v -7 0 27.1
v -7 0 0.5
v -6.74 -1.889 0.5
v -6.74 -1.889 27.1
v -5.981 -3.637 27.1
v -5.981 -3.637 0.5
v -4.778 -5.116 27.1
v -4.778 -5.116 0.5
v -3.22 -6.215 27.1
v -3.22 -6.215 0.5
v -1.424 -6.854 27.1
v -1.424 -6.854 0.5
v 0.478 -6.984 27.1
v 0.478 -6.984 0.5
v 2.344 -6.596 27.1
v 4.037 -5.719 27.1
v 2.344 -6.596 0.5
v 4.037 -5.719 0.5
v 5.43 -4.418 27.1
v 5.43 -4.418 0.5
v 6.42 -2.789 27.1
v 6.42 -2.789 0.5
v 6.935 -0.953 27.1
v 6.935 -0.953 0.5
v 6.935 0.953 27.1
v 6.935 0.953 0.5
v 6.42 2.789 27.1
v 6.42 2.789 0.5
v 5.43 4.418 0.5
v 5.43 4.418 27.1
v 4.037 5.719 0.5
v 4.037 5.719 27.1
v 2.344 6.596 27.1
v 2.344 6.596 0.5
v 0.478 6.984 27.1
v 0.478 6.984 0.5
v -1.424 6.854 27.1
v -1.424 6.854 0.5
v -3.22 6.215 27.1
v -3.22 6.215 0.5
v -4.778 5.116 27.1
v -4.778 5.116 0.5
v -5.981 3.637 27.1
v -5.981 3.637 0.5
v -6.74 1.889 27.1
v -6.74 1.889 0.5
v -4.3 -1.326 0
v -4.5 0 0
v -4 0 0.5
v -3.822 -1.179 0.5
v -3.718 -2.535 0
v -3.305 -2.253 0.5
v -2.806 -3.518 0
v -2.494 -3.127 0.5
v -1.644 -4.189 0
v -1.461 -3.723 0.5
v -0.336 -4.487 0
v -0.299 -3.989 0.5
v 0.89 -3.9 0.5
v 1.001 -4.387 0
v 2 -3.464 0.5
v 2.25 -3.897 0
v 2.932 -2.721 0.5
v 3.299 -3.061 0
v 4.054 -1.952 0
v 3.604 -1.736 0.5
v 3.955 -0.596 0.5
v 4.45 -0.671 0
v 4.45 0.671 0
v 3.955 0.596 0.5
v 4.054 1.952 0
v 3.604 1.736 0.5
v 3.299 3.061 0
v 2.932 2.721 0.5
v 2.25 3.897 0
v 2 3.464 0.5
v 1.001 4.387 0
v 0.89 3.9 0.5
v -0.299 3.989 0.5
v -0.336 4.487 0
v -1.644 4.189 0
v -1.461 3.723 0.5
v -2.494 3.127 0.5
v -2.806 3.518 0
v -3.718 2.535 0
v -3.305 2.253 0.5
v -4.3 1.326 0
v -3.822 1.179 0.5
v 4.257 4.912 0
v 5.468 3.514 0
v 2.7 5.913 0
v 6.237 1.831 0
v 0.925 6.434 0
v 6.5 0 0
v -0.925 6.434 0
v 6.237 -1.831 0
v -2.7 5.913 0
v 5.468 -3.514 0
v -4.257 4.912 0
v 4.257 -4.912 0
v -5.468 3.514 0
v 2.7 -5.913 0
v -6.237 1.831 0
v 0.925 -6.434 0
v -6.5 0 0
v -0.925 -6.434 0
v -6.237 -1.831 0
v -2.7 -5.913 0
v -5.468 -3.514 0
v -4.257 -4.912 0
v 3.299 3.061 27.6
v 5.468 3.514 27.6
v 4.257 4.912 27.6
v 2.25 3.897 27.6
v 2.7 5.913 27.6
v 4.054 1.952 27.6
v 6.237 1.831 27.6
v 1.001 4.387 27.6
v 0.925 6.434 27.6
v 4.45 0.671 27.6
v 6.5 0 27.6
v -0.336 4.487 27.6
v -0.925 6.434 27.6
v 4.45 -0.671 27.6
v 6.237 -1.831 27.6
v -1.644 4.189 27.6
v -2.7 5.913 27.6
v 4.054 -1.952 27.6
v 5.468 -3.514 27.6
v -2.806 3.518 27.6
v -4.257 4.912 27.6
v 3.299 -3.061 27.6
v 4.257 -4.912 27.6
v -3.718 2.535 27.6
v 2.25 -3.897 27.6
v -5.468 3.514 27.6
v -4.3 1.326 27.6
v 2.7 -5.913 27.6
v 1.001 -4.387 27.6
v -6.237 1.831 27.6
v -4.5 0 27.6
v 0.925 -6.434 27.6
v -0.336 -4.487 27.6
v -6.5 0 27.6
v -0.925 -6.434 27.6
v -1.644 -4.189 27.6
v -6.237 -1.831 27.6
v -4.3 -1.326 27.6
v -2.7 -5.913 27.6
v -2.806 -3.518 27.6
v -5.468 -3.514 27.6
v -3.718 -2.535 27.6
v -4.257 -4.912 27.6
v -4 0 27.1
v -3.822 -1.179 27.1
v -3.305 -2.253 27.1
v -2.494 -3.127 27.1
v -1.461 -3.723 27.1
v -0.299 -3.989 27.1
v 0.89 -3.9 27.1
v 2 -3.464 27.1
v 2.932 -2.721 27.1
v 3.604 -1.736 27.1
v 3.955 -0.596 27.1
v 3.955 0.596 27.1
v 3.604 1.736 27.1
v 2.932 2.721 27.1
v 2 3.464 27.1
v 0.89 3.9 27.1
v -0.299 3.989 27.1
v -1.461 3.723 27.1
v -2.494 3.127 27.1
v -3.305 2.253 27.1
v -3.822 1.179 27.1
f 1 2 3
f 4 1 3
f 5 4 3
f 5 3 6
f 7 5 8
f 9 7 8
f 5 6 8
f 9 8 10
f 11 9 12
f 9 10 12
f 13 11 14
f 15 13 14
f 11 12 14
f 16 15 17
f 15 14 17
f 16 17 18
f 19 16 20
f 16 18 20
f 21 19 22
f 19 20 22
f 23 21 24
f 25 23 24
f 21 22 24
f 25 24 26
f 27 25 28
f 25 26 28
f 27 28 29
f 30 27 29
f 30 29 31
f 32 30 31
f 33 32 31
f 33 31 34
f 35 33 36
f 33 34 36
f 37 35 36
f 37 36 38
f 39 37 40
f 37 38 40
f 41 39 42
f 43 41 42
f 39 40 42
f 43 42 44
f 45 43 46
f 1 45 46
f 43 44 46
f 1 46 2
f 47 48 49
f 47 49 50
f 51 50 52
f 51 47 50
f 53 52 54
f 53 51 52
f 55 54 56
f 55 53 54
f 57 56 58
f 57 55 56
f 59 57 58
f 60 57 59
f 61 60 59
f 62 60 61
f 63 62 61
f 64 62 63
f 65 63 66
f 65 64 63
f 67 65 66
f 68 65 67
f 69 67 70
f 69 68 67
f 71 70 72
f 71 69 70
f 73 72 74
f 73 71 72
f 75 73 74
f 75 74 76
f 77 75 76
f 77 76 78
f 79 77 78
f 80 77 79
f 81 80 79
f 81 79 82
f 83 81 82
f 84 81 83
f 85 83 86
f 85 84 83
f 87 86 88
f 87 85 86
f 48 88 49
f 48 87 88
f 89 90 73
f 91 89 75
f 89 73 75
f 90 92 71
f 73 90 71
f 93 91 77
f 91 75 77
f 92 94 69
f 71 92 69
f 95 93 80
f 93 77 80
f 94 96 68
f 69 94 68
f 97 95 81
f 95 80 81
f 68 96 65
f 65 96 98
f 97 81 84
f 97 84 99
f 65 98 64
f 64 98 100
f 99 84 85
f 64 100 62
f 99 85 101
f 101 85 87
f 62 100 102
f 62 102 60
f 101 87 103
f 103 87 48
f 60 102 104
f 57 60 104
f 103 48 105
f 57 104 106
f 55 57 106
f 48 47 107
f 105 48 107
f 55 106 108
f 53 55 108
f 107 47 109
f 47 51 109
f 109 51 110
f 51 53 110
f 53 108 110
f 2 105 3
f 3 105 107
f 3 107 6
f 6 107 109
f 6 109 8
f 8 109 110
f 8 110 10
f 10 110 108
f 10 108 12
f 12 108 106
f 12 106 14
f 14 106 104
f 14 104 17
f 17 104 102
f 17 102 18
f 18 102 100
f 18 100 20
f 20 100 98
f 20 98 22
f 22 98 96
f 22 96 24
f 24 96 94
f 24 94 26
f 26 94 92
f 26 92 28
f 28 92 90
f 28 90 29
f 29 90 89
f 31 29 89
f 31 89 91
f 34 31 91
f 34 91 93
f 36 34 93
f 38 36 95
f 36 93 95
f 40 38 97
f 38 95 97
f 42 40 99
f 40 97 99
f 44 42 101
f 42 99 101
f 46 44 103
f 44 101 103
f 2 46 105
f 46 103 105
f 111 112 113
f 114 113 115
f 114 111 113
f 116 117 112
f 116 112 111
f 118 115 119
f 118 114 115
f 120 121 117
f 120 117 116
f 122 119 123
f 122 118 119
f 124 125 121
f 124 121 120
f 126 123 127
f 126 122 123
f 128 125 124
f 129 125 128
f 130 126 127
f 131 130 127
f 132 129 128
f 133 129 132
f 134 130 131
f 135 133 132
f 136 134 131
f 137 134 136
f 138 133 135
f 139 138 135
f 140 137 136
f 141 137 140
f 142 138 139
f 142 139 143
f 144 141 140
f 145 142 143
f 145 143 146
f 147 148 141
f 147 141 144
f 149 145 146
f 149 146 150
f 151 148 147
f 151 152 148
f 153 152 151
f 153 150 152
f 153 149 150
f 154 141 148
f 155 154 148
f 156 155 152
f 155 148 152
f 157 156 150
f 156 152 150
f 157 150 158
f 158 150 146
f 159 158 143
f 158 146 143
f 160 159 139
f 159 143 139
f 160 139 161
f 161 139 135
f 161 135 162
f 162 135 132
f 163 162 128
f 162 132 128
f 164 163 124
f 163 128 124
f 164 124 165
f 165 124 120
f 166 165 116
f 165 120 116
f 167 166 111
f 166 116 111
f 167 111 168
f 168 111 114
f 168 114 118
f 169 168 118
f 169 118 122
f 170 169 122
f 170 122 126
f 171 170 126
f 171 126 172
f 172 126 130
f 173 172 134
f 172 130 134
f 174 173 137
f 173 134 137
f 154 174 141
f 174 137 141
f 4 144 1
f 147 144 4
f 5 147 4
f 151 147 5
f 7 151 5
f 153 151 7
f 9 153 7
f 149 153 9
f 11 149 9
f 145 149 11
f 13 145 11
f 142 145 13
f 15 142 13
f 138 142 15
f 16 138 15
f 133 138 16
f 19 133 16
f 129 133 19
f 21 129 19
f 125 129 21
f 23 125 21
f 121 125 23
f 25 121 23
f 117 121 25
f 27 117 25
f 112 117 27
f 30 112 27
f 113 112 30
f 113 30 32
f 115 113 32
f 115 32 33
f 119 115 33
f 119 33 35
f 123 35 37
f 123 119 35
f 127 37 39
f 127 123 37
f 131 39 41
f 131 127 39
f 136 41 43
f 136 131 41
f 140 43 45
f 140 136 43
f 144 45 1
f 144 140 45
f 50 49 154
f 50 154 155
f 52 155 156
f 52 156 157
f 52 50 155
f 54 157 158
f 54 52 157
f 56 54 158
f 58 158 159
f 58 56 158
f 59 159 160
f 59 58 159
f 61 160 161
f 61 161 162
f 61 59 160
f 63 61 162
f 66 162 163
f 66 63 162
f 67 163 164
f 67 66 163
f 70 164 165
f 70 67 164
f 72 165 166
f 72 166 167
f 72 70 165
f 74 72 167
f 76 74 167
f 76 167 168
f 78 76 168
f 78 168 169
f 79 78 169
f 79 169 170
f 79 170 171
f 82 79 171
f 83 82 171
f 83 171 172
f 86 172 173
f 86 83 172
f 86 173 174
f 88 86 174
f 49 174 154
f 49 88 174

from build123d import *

# Parameters (mm, degrees)
ESQUISSE1_R          = 7
ESQUISSE1_R_2        = 4
BASE_EXTRUSION_DEPTH = 27.6
CHANFREIN2_SIZE      = 0.5


with BuildPart() as part:
    # Esquisse1 → Base-Extrusion (new body)
    with BuildSketch(Plane.XY):
        with Locations(Location((0, 0, 0), (0, 0, 180))):
            Circle(ESQUISSE1_R)
        with Locations(Location((0, 0, 0), (0, 0, 180))):
            Circle(ESQUISSE1_R_2, mode=Mode.SUBTRACT)
    extrude(amount=BASE_EXTRUSION_DEPTH)

    # Chanfrein2
    chanfrein2_edges = [part.edges().sort_by_distance(p)[0] for p in [
        (7, 0, 0),
        (7, 0, 27.6),
        (4, 0, 0),
        (4, 0, 27.6),
    ]]
    chamfer(chanfrein2_edges, length=CHANFREIN2_SIZE)


solid = part.part
